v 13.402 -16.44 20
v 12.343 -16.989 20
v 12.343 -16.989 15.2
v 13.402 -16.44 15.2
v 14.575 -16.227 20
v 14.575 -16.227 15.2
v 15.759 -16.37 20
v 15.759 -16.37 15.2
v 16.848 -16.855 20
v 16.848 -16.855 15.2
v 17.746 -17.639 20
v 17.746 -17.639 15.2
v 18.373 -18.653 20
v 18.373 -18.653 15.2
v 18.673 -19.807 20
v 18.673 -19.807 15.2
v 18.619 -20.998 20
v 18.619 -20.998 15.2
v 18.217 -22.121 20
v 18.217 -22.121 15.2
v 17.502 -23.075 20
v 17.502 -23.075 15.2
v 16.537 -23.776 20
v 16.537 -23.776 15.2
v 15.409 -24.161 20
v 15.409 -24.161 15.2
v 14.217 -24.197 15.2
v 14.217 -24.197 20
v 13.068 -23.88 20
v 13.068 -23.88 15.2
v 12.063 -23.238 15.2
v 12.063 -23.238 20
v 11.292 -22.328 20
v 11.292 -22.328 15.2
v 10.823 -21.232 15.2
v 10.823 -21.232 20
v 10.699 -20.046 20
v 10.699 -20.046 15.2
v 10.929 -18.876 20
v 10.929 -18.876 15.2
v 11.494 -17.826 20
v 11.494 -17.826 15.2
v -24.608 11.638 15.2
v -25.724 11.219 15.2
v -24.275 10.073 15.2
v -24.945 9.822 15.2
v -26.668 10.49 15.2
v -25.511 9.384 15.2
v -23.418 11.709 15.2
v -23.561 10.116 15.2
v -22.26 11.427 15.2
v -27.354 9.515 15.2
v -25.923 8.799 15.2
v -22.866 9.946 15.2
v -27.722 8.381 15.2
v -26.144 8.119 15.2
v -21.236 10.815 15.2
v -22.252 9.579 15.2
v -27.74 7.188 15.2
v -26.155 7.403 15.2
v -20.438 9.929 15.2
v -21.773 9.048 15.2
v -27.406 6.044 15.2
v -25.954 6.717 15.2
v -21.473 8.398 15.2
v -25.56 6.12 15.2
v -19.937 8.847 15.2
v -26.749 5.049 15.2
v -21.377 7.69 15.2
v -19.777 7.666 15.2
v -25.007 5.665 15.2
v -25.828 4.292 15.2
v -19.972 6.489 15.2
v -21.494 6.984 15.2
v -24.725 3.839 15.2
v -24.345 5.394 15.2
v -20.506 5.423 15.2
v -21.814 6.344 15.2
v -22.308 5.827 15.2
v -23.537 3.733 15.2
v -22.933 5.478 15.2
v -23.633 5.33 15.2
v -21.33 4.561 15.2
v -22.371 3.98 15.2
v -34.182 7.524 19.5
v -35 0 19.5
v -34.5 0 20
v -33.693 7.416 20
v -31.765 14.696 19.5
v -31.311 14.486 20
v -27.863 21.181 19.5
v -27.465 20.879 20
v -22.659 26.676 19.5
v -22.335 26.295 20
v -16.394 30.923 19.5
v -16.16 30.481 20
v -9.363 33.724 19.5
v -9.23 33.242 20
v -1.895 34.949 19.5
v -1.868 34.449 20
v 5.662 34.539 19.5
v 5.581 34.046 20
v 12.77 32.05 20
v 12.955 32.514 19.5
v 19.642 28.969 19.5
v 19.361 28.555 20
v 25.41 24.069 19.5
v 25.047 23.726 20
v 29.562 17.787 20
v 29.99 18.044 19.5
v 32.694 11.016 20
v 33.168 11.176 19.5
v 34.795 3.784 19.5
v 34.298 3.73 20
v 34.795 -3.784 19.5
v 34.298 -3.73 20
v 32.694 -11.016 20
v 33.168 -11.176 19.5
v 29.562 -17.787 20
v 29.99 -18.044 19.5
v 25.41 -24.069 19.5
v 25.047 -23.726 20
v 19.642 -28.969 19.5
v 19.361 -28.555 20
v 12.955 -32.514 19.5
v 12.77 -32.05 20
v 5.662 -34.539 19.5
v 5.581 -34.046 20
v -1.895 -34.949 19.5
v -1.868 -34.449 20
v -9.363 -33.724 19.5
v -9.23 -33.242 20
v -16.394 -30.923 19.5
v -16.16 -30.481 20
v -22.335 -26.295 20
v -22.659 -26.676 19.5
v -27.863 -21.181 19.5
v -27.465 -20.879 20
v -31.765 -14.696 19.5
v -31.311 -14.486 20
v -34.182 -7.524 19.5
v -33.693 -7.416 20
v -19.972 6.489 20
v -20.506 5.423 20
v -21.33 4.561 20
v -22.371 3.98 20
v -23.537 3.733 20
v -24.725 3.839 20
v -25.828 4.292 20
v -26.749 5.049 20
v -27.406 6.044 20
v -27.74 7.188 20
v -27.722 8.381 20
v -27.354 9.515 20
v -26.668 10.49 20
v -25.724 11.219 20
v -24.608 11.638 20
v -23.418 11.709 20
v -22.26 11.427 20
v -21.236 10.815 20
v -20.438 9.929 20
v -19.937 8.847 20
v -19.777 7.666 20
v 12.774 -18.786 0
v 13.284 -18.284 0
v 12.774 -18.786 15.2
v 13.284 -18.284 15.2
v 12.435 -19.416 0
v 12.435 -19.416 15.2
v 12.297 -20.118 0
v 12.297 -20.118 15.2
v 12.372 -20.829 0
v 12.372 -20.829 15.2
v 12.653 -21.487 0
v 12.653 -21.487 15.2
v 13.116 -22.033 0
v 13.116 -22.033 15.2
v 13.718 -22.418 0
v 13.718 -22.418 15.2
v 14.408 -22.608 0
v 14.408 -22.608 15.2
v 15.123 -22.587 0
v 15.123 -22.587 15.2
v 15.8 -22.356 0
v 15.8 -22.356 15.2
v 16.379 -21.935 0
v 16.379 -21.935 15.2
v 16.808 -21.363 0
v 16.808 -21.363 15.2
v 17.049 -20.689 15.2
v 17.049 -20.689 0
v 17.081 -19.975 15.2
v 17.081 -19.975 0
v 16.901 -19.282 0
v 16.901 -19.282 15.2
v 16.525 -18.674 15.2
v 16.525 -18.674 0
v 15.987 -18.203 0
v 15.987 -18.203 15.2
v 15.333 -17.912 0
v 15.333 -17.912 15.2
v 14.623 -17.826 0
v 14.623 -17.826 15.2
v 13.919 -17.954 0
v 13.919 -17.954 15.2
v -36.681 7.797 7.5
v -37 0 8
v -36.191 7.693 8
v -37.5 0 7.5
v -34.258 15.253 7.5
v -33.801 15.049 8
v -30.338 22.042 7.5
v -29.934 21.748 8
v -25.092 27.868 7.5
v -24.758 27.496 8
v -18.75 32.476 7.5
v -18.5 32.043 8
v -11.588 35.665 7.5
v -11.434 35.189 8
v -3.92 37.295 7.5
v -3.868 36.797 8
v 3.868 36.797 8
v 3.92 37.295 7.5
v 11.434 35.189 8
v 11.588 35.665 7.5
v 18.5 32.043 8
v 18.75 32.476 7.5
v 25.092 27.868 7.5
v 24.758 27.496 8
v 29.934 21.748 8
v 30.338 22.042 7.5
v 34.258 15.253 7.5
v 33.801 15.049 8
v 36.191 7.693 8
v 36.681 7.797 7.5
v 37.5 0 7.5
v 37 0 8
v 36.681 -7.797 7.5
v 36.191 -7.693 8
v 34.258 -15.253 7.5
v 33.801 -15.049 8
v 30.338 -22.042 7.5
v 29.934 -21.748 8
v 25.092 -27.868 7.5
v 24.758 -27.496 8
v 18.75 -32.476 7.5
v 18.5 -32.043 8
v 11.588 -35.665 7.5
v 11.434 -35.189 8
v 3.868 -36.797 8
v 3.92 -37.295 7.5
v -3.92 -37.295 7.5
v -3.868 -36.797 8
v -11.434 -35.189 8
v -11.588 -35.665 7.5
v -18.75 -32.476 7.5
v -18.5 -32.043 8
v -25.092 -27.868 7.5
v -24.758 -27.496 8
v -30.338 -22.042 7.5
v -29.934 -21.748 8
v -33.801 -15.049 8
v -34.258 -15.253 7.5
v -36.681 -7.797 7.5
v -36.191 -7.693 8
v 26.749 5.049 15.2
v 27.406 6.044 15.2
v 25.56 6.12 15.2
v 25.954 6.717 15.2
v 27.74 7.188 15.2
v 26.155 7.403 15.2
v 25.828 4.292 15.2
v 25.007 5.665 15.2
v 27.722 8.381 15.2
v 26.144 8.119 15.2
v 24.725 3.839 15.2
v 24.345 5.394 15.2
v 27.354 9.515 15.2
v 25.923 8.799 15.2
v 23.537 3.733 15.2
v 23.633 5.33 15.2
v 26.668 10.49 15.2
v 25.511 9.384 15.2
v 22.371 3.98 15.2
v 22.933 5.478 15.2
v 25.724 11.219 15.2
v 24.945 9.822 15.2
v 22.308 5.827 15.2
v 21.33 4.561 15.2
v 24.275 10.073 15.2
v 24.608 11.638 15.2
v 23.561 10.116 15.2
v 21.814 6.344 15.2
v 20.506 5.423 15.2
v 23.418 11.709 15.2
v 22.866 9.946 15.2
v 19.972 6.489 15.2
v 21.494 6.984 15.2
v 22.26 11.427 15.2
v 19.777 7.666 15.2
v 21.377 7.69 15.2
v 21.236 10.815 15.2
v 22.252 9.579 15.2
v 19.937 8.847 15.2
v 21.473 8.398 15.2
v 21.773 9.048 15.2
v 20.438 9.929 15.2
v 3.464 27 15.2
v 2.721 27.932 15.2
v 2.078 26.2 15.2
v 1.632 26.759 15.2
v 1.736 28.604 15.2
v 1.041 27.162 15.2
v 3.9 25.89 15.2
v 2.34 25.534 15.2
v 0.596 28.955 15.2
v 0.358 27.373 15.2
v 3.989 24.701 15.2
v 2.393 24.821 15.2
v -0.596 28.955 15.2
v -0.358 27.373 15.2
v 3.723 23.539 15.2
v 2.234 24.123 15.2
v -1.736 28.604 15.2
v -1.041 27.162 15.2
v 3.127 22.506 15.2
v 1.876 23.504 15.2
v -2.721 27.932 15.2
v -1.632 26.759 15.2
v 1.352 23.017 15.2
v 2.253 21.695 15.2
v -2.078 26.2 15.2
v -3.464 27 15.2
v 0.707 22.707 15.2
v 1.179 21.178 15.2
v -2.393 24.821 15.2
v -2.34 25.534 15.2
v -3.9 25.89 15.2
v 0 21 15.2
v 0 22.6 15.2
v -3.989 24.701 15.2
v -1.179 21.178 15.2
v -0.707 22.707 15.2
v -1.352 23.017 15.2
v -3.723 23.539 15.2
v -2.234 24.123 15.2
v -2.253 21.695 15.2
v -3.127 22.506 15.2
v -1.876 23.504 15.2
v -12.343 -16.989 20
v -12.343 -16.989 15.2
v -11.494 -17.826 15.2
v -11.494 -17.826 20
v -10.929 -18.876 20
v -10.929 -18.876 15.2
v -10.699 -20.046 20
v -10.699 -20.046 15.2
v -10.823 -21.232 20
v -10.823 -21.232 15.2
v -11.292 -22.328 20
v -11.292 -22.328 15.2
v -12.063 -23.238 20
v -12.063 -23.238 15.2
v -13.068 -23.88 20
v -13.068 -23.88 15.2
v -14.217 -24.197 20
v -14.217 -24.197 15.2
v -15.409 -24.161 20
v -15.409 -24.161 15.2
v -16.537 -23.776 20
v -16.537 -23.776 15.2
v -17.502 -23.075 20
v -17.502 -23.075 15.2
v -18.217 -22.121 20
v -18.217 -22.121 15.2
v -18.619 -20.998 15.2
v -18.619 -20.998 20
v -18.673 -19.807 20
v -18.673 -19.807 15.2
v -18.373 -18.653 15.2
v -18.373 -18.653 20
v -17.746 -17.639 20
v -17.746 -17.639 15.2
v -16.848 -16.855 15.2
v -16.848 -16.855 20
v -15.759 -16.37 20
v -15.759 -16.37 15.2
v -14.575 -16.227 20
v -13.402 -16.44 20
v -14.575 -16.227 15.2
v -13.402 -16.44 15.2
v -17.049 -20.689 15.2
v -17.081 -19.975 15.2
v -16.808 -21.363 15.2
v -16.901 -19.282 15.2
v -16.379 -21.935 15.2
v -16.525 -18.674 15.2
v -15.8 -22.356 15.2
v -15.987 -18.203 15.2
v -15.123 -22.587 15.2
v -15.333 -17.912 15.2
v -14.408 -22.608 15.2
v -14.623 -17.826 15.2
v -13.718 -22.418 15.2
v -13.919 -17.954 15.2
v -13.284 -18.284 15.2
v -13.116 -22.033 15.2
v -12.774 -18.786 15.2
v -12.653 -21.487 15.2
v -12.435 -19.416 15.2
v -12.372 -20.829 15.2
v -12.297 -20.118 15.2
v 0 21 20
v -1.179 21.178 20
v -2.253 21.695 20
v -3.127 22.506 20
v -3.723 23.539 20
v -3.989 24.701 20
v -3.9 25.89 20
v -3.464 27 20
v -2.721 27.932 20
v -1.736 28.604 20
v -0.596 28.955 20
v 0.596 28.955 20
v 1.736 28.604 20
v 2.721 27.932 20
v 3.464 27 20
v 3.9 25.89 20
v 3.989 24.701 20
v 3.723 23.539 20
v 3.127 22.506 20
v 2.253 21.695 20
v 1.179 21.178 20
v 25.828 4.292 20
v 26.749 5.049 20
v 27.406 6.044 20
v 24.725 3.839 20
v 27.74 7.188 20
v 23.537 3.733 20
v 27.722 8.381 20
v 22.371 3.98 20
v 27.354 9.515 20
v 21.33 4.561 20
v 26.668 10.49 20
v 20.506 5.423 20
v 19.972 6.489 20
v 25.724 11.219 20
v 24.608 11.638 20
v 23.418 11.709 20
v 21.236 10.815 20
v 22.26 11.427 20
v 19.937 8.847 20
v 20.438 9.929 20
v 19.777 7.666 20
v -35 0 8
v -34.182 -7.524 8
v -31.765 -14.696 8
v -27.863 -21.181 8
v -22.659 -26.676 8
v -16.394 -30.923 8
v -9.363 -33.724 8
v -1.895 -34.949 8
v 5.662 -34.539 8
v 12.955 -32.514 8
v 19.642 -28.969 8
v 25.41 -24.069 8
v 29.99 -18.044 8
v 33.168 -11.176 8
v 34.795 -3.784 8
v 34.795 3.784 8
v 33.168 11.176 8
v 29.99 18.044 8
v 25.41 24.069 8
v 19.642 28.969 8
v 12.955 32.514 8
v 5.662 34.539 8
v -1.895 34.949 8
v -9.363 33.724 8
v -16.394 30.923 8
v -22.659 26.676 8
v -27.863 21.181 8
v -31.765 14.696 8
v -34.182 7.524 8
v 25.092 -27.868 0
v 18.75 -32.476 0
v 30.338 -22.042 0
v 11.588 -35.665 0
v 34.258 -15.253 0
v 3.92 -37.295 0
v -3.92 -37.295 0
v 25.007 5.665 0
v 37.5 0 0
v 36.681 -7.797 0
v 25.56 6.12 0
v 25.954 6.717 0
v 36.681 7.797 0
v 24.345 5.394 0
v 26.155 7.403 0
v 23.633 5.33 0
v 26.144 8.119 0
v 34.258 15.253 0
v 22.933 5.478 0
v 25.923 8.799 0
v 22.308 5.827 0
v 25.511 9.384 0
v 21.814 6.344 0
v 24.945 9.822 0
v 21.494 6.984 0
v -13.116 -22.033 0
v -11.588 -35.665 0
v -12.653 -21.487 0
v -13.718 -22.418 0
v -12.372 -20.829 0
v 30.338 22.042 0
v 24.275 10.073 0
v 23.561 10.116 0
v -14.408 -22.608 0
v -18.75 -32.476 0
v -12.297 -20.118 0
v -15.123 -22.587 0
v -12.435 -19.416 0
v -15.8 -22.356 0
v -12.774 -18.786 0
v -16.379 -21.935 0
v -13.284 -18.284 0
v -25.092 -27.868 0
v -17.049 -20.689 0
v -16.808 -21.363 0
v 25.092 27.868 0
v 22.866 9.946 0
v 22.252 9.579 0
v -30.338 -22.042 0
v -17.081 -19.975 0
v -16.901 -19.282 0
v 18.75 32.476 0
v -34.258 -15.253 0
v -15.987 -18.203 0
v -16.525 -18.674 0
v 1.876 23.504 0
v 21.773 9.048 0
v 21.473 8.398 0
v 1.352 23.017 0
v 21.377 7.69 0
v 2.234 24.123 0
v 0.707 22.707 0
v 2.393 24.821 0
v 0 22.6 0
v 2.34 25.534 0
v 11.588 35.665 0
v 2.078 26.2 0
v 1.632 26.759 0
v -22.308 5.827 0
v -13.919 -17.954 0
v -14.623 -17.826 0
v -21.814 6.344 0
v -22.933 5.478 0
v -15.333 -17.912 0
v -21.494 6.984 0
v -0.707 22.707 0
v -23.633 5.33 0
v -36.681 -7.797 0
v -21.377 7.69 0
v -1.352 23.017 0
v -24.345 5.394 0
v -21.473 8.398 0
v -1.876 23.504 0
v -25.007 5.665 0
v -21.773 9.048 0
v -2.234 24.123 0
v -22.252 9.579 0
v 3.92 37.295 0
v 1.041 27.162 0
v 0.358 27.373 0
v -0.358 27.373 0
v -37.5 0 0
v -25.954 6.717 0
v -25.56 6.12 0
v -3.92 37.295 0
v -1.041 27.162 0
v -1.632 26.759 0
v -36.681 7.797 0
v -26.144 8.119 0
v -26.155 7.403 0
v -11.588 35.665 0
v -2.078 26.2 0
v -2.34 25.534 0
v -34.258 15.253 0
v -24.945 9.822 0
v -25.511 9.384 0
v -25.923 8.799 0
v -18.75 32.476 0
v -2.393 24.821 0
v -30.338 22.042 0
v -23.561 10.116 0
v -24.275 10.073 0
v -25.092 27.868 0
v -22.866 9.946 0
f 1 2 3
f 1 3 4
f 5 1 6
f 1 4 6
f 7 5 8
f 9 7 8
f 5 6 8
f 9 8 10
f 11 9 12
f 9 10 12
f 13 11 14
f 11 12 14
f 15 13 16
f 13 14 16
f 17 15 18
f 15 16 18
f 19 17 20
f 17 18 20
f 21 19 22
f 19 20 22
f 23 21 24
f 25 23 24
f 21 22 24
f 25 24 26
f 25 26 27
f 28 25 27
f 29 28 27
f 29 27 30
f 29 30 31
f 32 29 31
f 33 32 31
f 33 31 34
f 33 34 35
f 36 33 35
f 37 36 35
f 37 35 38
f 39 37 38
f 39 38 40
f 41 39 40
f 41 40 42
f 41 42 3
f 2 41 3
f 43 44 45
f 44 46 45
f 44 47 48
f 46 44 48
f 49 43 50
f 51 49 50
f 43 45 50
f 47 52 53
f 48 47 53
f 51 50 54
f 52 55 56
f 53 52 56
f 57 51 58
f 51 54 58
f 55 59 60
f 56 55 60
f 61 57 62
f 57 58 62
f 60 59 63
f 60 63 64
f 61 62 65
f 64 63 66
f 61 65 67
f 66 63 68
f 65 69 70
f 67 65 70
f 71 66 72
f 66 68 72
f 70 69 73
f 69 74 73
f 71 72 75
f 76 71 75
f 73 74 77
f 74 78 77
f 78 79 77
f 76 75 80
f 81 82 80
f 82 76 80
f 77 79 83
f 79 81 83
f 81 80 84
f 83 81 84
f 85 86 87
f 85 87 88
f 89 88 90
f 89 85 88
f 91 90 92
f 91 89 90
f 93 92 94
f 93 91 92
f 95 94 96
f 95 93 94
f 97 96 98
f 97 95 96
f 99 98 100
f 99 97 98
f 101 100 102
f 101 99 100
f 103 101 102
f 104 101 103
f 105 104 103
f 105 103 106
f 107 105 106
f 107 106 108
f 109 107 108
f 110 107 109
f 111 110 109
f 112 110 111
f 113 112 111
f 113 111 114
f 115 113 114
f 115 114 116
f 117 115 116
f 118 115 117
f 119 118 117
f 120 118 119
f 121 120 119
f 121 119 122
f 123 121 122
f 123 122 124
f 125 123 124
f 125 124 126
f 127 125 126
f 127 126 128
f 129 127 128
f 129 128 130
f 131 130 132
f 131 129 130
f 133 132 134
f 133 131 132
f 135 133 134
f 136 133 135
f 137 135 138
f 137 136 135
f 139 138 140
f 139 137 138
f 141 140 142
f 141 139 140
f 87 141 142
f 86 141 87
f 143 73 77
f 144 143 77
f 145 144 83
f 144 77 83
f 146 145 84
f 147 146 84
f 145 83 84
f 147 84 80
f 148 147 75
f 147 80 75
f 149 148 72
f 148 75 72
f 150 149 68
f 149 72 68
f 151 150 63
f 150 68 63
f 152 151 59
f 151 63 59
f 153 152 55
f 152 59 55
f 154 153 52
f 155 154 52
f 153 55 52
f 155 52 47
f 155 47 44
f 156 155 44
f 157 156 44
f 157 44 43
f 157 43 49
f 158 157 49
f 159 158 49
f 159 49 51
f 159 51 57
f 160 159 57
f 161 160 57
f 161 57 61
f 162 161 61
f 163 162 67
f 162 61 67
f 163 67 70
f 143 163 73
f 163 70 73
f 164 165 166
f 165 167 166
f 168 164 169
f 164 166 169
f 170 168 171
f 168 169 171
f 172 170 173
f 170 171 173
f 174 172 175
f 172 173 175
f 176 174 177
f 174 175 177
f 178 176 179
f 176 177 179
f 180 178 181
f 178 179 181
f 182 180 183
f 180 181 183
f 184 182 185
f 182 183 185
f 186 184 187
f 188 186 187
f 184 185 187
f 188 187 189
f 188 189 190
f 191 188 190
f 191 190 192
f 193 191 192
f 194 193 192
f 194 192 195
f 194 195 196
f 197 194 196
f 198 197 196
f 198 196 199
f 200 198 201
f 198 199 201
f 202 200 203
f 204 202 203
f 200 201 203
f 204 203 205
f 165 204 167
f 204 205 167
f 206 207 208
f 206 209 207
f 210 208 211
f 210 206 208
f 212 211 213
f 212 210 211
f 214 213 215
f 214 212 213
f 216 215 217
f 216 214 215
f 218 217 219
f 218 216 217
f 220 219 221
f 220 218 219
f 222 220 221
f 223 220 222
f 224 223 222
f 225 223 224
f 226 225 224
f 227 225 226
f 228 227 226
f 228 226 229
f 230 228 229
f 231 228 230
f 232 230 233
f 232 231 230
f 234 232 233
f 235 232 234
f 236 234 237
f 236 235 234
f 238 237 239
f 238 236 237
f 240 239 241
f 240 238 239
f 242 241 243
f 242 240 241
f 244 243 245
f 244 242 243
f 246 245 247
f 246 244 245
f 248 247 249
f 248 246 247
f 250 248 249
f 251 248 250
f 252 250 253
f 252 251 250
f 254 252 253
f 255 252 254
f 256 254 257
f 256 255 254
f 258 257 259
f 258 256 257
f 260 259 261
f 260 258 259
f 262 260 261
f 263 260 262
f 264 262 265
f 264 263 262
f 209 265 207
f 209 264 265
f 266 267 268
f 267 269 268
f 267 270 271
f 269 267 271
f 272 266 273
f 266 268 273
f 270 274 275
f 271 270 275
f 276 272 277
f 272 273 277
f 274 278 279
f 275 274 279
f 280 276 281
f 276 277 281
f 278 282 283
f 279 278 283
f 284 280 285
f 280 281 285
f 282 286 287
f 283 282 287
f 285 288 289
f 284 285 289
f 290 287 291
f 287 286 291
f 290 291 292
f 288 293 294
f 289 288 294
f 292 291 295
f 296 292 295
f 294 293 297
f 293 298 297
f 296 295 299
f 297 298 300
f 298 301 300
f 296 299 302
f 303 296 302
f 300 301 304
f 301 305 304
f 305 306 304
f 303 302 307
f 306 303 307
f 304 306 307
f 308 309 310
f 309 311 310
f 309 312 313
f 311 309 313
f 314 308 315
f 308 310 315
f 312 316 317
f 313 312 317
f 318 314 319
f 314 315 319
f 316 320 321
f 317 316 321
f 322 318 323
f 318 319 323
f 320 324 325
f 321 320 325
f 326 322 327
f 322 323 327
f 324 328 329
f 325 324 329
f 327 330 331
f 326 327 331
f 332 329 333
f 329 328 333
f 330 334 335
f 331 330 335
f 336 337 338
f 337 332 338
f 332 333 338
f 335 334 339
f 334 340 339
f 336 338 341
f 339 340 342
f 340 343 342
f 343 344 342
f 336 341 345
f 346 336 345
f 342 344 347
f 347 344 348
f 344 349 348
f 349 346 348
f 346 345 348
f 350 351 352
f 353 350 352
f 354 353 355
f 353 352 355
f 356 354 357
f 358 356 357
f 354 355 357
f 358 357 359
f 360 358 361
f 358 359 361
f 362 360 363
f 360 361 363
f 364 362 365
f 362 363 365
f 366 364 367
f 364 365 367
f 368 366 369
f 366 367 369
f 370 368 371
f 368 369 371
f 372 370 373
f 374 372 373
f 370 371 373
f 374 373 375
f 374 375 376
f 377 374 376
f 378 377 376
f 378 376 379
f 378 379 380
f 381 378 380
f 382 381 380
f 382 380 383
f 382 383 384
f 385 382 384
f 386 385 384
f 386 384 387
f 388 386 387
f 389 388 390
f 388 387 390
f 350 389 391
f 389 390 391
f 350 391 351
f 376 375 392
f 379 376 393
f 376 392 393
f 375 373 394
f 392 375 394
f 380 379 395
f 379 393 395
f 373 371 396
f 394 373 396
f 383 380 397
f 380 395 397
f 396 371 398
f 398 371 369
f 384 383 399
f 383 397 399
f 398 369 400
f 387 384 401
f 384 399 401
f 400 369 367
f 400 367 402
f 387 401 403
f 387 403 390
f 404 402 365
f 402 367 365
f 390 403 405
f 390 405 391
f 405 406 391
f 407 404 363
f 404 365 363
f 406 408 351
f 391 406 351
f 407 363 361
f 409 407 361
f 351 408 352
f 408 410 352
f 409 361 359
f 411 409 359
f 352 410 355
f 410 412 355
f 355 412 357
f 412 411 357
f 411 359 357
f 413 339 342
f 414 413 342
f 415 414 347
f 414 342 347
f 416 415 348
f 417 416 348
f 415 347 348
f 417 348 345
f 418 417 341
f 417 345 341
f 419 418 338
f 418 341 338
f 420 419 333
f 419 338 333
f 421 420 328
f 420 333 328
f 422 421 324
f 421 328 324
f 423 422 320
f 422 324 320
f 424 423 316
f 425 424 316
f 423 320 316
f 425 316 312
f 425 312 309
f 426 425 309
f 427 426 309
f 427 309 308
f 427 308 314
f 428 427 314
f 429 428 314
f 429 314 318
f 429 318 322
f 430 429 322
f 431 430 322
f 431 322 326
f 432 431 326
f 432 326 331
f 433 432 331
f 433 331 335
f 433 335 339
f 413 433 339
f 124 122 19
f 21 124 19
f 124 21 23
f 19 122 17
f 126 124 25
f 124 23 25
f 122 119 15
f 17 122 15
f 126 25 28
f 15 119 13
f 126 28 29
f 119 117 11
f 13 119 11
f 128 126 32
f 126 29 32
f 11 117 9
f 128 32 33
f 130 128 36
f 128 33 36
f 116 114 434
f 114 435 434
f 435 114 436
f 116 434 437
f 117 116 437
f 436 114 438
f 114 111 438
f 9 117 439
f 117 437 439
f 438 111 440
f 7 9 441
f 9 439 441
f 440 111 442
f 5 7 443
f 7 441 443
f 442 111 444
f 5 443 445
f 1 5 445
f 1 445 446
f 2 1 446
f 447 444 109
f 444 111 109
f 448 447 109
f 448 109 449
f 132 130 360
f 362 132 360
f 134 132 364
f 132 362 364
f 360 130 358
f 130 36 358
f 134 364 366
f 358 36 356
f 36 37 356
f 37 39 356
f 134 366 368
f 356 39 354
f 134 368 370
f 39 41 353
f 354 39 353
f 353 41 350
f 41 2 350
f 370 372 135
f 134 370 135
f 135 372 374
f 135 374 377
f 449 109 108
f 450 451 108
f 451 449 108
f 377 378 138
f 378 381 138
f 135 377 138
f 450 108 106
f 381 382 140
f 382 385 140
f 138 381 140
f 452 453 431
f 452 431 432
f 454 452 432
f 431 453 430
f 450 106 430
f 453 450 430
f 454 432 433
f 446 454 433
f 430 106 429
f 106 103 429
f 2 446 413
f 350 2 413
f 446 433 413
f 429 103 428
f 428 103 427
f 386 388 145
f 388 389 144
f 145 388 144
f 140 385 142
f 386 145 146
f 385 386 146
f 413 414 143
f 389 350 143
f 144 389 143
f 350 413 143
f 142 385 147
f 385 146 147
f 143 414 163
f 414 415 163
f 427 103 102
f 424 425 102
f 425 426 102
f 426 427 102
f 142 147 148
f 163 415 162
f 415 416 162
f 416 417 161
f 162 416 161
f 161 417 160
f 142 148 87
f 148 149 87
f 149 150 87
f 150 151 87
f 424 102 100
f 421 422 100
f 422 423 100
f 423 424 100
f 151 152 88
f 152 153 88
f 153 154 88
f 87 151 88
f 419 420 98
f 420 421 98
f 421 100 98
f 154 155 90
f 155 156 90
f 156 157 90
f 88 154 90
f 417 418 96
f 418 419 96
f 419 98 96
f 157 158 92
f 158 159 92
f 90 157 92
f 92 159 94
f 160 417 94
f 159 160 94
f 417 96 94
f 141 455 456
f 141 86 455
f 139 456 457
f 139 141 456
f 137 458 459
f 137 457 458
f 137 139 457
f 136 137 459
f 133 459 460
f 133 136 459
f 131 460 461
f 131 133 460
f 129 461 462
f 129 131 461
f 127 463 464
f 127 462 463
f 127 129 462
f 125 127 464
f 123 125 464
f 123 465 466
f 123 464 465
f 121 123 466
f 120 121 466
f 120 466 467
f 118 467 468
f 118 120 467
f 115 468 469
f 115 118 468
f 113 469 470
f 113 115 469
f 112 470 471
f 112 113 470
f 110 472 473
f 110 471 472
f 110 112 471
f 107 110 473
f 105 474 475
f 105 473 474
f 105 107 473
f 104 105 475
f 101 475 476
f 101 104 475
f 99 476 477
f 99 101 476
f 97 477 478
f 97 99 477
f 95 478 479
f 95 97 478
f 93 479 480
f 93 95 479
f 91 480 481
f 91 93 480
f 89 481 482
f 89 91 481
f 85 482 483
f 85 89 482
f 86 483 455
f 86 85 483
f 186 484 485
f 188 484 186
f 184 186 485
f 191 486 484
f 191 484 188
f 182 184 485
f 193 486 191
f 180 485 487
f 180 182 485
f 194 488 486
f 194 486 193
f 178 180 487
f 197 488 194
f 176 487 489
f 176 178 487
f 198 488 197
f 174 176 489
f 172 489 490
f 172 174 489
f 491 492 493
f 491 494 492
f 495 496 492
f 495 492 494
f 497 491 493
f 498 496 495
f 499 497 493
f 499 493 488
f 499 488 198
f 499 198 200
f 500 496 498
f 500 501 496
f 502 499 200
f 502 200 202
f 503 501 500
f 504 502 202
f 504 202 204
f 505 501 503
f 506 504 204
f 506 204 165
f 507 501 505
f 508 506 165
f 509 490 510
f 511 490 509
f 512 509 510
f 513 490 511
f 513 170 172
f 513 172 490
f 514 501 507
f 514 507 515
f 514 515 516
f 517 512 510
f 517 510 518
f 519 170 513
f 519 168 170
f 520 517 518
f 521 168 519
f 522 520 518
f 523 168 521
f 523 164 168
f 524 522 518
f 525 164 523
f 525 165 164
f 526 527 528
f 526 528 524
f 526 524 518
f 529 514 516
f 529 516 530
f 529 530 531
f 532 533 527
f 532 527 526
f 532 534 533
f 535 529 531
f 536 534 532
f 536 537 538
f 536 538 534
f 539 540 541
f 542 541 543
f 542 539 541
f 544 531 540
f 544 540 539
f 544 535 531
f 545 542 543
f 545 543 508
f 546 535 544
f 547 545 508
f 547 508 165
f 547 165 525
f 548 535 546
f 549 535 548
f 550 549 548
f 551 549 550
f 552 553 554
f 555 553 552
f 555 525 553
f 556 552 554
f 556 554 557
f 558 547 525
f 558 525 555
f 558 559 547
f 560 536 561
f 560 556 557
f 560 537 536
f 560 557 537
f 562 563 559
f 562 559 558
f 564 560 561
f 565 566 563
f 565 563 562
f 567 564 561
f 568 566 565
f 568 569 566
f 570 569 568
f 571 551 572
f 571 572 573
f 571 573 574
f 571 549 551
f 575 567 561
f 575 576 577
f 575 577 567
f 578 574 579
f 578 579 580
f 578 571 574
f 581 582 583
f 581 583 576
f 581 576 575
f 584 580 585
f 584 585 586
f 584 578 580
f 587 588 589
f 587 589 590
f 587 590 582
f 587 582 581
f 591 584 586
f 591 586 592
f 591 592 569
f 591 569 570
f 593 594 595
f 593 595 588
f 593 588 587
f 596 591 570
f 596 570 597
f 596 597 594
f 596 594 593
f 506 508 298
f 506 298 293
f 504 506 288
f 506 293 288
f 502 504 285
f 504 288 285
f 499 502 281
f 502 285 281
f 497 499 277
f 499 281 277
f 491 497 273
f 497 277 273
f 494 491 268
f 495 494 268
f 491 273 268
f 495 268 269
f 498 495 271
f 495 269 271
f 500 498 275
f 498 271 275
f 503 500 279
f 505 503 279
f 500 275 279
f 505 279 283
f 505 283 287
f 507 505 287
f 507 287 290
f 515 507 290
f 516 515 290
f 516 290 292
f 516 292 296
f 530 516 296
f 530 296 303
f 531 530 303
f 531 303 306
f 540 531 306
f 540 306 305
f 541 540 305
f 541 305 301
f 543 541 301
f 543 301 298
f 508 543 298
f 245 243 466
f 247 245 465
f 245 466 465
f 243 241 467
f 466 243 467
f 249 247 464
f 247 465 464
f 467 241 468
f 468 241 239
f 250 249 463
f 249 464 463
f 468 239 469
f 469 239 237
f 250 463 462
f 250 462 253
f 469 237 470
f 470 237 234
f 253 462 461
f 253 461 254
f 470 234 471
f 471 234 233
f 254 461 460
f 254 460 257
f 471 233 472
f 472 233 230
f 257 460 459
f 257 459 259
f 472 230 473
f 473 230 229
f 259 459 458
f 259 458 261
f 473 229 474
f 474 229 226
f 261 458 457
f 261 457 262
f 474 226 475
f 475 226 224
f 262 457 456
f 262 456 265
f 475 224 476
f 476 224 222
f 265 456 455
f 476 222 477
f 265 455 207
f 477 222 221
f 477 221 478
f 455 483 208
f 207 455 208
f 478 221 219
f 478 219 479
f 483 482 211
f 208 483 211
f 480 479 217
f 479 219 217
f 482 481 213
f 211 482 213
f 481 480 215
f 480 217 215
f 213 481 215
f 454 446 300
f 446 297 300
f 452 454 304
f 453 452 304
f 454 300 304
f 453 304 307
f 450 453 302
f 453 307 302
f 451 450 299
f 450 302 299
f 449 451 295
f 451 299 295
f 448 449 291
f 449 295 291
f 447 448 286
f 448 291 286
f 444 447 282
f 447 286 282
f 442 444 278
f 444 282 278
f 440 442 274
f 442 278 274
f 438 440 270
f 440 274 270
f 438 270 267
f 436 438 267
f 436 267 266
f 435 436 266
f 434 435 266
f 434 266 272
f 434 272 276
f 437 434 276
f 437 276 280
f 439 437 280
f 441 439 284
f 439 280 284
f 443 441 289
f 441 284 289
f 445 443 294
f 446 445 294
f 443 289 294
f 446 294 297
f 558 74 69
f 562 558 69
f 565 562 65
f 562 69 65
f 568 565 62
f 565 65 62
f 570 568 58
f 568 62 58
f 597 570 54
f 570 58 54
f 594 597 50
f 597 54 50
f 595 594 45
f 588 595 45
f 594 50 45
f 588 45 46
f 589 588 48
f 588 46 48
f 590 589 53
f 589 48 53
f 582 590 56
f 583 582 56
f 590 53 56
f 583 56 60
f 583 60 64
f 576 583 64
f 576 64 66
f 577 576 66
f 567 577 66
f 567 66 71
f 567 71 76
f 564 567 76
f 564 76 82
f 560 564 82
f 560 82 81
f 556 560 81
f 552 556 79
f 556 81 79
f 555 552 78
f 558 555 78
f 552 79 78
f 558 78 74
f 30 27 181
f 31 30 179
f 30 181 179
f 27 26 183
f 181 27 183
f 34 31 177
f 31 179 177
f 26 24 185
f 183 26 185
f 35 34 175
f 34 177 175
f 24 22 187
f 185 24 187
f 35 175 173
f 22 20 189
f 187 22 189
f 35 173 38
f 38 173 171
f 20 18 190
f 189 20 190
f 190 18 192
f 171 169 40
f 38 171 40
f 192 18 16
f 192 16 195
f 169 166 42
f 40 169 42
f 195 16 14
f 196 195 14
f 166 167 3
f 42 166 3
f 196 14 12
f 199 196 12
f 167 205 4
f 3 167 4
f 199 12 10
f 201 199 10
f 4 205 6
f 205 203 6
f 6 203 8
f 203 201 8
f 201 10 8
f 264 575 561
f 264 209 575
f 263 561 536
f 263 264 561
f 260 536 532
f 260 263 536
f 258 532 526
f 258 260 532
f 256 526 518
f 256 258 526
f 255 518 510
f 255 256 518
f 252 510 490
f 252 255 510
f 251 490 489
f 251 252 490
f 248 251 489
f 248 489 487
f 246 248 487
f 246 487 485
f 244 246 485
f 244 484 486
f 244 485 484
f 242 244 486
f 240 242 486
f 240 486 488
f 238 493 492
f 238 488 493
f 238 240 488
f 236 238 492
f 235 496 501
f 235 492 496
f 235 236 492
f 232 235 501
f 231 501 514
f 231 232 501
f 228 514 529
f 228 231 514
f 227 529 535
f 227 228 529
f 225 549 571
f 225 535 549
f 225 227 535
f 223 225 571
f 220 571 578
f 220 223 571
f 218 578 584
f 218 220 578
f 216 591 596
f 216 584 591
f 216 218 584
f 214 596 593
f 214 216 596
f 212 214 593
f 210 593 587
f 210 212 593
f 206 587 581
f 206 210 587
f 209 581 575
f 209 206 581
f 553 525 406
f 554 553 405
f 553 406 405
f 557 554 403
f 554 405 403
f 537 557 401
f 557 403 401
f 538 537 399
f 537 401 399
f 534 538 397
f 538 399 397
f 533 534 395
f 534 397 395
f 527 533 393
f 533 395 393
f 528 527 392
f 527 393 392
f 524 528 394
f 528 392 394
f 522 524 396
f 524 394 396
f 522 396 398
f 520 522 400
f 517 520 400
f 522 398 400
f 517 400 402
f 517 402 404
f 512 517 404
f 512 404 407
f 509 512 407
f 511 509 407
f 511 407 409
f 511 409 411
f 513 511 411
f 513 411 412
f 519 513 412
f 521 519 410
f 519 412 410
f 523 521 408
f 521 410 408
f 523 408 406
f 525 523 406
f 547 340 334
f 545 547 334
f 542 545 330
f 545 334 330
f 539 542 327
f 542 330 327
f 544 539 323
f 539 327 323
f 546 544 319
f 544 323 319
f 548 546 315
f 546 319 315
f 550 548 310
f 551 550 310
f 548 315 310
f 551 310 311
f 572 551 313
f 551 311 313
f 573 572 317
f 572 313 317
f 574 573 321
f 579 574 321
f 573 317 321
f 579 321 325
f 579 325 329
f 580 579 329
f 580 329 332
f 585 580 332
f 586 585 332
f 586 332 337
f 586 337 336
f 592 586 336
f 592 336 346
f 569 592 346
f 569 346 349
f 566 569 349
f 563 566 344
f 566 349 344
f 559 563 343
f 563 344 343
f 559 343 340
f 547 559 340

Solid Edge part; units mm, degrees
sketch "Sketch1" plane through (0, 0, 0) normal (0, -1, 0) x (1, 0, 0)
  line L0 (-37.5, 0) -> (-37.5, 8)
  line L1 (-37.5, 8) -> (-35, 8)
  line L2 (-35, 8) -> (-35, 20)
  line L3 (-35, 20) -> (0, 20)
  line L4 (0, 0) -> (-37.5, 0)
  dimension "D1" = 20
  dimension "D2" = 8
revolve "RevolvedProtrusion1" add sketch "Sketch1" angle 360 about axis through (0, 0, 40) along (0, 0, -1)
chamfer "Chamfer1" distance 0.5 angle 45 2 edges at (35, 0, 20) (37.5, 0, 8)
hole "Hole_1" at (0, 25, 20) direction (0, 0, -1) diameter 4.8 end up to next counterbore diameter 8 counterbore depth 4.8
pattern_circular "Pattern1" count 5 over 360 about axis through (0, 0, 20) along (0, 0, 1) of "Hole_1"
properties material "Polyethylene, low density"
